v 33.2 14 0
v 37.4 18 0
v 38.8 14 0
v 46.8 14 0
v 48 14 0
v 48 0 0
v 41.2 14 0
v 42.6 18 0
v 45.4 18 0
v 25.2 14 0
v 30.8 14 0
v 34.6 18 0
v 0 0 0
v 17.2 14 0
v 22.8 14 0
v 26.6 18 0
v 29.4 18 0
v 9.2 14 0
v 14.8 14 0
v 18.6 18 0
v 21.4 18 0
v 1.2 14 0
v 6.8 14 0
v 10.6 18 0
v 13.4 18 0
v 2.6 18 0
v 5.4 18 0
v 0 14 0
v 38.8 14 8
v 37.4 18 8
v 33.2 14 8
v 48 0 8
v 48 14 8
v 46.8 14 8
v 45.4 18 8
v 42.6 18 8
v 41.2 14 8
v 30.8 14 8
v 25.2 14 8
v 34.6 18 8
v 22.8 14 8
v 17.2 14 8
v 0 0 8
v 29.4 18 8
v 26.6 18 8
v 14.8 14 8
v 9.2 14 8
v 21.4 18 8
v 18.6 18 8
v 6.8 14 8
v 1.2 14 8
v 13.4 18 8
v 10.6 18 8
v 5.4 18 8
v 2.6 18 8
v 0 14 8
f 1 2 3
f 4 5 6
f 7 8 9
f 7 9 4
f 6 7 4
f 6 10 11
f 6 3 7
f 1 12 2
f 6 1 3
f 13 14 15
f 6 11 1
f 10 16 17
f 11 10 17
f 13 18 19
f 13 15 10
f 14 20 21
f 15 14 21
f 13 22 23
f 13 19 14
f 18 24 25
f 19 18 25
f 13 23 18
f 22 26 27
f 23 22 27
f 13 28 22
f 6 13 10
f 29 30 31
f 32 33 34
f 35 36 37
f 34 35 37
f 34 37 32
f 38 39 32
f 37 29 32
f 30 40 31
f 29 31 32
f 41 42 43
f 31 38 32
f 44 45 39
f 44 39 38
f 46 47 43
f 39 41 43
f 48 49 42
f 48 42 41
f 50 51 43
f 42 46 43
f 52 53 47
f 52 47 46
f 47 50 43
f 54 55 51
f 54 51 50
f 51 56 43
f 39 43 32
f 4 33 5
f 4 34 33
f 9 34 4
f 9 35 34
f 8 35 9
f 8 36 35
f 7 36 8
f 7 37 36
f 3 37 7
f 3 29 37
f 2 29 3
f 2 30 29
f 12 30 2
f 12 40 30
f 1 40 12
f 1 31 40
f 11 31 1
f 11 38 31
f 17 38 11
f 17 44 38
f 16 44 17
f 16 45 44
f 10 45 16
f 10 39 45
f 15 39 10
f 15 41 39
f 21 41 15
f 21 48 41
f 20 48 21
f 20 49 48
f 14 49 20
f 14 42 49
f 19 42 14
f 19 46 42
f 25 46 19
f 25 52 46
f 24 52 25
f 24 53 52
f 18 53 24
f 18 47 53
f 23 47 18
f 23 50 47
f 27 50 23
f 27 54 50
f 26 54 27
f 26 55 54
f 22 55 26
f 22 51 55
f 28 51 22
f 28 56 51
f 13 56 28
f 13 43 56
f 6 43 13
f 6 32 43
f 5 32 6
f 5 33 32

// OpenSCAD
$fn = 32;

// ----------------------------------------------------------------------
// Gear rack: 6 teeth, pitch 8 mm
// ----------------------------------------------------------------------

// --- parameters (mm) ---
teeth = 6;                // number of teeth
pitch = 8;                // tooth pitch, X
root_w = 5.6;             // tooth width at the root
tip_w = 2.8;              // tooth width at the tip
base_h = 14;              // rack body height, Y
tooth_h = 4;              // tooth height above the body
plate_t = 8;              // rack width, Z (extrusion height)
fit_tol = 0.05;           // declared fit tolerance (prompt contract)
free_tol = 0.3;           // declared free tolerance (prompt contract)

rack_l = teeth * pitch;  // overall length
total_h = base_h + tooth_h;  // overall height

profile = [[0, 0], [48, 0], [48, 14], [46.8, 14], [45.4, 18], [42.6, 18], [41.2, 14], [38.8, 14], [37.4, 18], [34.6, 18], [33.2, 14], [30.8, 14], [29.4, 18], [26.6, 18], [25.2, 14], [22.8, 14], [21.4, 18], [18.6, 18], [17.2, 14], [14.8, 14], [13.4, 18], [10.6, 18], [9.2, 14], [6.8, 14], [5.4, 18], [2.6, 18], [1.2, 14], [0, 14]];  // primary outline, 28 points, counter clockwise

// --- the one profile operation ---
linear_extrude(height = plate_t) polygon(points = profile);
